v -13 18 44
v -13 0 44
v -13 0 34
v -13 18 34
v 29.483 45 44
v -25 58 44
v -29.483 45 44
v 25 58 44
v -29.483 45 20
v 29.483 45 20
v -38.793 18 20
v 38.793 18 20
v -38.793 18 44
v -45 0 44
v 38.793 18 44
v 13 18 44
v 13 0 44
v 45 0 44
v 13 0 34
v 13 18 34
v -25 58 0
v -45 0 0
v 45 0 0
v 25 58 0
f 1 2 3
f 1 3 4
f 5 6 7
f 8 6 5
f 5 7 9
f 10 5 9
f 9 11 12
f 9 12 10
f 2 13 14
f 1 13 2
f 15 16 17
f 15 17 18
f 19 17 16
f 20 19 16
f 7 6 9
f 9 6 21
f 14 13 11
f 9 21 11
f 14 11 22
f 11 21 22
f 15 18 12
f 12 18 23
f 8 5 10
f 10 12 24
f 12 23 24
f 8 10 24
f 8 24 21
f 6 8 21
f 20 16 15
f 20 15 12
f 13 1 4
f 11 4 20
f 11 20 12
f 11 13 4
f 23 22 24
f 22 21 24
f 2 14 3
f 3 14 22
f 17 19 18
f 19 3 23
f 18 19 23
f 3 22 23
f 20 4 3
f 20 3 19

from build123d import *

# Parameters (mm, degrees)
BOSS_EXTRUDE1_DEPTH     = 44
CUT_EXTRUDE1_DEPTH      = 86.586213843
CUT_EXTRUDE1_DEPTH_BACK = 86.586213843
SKETCH2_W               = 24
SKETCH2_H               = 27
SKETCH3_W               = 26
SKETCH3_H               = 18
CUT_EXTRUDE2_DEPTH      = 10


with BuildPart() as part:
    # Sketch1 → Boss-Extrude1 (new body)
    with BuildSketch(Plane.XY):
        Polygon((-45, 0), (45, 0), (25, 58), (-25, 58), align=None)
    extrude(amount=BOSS_EXTRUDE1_DEPTH)

    # Sketch2 → Cut-Extrude1 (cut, two sides: drawn at the far end of the back side and taken through both)
    with BuildSketch(Plane(origin=(0, 0, 0), x_dir=(0, 0, -1), z_dir=(1, 0, 0)).offset(-CUT_EXTRUDE1_DEPTH_BACK)):
        with Locations((-32, 31.5)):
            Rectangle(SKETCH2_W, SKETCH2_H)
    extrude(amount=CUT_EXTRUDE1_DEPTH + CUT_EXTRUDE1_DEPTH_BACK, mode=Mode.SUBTRACT)

    # Sketch3 → Cut-Extrude2 (cut)
    with BuildSketch(Plane.XY.offset(44)):
        with Locations((0, 9)):
            Rectangle(SKETCH3_W, SKETCH3_H)
    extrude(amount=-CUT_EXTRUDE2_DEPTH, mode=Mode.SUBTRACT)


solid = part.part
